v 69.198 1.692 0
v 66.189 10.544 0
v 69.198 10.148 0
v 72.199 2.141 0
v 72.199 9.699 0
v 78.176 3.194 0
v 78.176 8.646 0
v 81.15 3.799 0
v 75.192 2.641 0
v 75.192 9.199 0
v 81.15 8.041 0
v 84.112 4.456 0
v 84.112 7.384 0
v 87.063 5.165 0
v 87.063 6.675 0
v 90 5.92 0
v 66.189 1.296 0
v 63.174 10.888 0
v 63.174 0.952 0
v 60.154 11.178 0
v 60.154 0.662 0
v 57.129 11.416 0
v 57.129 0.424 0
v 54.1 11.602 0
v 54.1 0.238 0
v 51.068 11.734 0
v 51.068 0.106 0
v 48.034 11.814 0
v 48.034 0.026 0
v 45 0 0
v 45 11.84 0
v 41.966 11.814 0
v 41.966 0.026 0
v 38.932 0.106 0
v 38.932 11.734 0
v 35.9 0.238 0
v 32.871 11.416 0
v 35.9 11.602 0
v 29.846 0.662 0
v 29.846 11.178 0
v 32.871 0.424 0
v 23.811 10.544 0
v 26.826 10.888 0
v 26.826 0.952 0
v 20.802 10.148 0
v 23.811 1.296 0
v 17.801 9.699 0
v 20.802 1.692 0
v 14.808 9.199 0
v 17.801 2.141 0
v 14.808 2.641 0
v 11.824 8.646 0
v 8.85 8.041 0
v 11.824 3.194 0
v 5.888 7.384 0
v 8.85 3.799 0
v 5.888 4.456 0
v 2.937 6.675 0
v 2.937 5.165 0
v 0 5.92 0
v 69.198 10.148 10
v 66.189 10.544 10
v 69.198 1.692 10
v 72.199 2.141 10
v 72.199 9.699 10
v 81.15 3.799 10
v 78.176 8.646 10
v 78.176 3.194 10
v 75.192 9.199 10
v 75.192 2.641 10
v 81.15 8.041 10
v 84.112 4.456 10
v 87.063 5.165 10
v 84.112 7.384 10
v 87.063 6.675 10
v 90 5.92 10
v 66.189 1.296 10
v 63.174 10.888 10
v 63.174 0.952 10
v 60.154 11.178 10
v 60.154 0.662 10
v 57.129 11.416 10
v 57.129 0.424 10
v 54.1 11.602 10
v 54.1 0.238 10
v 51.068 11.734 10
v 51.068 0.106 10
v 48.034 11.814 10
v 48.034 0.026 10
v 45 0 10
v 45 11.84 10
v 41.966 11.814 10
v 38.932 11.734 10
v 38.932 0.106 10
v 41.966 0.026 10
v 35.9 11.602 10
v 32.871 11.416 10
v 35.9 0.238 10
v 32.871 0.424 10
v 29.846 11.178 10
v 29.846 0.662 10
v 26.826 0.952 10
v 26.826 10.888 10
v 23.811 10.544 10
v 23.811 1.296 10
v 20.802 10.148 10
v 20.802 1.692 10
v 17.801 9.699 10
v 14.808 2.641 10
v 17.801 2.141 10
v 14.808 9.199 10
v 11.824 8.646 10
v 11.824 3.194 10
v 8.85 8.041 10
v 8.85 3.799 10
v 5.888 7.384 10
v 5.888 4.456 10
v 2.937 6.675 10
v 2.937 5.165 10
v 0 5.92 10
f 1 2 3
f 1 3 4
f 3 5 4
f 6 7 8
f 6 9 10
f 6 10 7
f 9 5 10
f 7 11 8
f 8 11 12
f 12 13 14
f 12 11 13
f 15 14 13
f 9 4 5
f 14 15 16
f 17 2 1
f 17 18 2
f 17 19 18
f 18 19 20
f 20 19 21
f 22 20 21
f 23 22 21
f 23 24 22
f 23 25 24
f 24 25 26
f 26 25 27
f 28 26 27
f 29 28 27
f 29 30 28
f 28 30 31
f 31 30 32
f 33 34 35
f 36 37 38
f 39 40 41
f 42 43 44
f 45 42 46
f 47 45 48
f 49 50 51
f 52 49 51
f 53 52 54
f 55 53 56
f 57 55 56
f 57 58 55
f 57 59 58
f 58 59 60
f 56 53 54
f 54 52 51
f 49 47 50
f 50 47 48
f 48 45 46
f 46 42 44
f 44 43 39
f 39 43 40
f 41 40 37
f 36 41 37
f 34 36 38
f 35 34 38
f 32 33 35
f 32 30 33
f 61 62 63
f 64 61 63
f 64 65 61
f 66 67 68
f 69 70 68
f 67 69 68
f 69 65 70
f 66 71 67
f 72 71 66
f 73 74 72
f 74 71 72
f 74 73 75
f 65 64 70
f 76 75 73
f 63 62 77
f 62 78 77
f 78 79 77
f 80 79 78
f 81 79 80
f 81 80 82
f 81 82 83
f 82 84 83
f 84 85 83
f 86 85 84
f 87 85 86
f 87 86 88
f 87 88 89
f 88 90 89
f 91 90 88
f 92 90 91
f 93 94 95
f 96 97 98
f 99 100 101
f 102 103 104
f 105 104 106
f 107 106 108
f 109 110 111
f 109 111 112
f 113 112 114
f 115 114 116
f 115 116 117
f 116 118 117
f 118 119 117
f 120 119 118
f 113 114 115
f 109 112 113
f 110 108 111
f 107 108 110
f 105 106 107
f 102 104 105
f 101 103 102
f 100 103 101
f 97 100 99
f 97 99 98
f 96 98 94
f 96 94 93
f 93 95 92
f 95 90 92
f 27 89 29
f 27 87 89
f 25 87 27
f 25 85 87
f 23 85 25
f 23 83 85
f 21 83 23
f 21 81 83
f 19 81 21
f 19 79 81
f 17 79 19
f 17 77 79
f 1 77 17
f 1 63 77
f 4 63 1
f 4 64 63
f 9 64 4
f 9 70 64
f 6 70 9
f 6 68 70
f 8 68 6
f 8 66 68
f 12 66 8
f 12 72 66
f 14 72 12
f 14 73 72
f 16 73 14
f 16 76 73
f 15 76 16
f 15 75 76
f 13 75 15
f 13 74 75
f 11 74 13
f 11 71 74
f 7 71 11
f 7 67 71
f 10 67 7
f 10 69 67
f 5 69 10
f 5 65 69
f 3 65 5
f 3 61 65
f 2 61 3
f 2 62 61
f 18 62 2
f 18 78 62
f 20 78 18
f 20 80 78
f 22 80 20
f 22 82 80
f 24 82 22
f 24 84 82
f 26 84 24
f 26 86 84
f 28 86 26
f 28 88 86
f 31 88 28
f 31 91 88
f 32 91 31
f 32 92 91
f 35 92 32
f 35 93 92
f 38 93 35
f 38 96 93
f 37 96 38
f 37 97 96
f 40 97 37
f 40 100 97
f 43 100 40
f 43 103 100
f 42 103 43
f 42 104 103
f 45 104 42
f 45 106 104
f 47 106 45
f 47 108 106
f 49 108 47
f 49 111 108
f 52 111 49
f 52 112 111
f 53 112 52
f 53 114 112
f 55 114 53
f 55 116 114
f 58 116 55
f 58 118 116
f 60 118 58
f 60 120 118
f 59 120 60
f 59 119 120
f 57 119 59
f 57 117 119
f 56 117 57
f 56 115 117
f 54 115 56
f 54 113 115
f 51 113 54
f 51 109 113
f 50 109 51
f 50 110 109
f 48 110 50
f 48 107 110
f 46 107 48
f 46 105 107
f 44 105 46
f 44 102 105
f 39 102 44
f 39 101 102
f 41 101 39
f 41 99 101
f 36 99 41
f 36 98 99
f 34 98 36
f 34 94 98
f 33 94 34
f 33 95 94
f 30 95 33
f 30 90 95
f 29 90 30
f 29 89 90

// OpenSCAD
$fn = 32;

// ----------------------------------------------------------------------
// Arc profile plate: lens, 60 points
// ----------------------------------------------------------------------

// --- parameters (mm) ---
lens_chord = 90;          // chord length of the lens, X
arc_r = 173.87;           // radius of both arcs
arc_angle = 30;           // angle of each arc, degrees
sagitta = 5.92;           // bulge of each arc (half the lens height)
arc_step = 1;             // sampling step of the arcs, degrees
plate_t = 10;             // plate thickness, Z
fit_tol = 0.05;           // declared fit tolerance (prompt contract)
free_tol = 0.2;           // declared free tolerance (prompt contract)

bbox_y = 2 * sagitta;  // full lens height

profile = [[90, 5.92], [87.063, 6.675], [84.112, 7.384], [81.15, 8.041], [78.176, 8.646], [75.192, 9.199], [72.199, 9.699], [69.198, 10.148], [66.189, 10.544], [63.174, 10.888], [60.154, 11.178], [57.129, 11.416], [54.1, 11.602], [51.068, 11.734], [48.034, 11.814], [45, 11.84], [41.966, 11.814], [38.932, 11.734], [35.9, 11.602], [32.871, 11.416], [29.846, 11.178], [26.826, 10.888], [23.811, 10.544], [20.802, 10.148], [17.801, 9.699], [14.808, 9.199], [11.824, 8.646], [8.85, 8.041], [5.888, 7.384], [2.937, 6.675], [0, 5.92], [2.937, 5.165], [5.888, 4.456], [8.85, 3.799], [11.824, 3.194], [14.808, 2.641], [17.801, 2.141], [20.802, 1.692], [23.811, 1.296], [26.826, 0.952], [29.846, 0.662], [32.871, 0.424], [35.9, 0.238], [38.932, 0.106], [41.966, 0.026], [45, 0], [48.034, 0.026], [51.068, 0.106], [54.1, 0.238], [57.129, 0.424], [60.154, 0.662], [63.174, 0.952], [66.189, 1.296], [69.198, 1.692], [72.199, 2.141], [75.192, 2.641], [78.176, 3.194], [81.15, 3.799], [84.112, 4.456], [87.063, 5.165]];  // primary outline, 60 points, counter clockwise

// --- the one profile operation ---
linear_extrude(height = plate_t) polygon(points = profile);
